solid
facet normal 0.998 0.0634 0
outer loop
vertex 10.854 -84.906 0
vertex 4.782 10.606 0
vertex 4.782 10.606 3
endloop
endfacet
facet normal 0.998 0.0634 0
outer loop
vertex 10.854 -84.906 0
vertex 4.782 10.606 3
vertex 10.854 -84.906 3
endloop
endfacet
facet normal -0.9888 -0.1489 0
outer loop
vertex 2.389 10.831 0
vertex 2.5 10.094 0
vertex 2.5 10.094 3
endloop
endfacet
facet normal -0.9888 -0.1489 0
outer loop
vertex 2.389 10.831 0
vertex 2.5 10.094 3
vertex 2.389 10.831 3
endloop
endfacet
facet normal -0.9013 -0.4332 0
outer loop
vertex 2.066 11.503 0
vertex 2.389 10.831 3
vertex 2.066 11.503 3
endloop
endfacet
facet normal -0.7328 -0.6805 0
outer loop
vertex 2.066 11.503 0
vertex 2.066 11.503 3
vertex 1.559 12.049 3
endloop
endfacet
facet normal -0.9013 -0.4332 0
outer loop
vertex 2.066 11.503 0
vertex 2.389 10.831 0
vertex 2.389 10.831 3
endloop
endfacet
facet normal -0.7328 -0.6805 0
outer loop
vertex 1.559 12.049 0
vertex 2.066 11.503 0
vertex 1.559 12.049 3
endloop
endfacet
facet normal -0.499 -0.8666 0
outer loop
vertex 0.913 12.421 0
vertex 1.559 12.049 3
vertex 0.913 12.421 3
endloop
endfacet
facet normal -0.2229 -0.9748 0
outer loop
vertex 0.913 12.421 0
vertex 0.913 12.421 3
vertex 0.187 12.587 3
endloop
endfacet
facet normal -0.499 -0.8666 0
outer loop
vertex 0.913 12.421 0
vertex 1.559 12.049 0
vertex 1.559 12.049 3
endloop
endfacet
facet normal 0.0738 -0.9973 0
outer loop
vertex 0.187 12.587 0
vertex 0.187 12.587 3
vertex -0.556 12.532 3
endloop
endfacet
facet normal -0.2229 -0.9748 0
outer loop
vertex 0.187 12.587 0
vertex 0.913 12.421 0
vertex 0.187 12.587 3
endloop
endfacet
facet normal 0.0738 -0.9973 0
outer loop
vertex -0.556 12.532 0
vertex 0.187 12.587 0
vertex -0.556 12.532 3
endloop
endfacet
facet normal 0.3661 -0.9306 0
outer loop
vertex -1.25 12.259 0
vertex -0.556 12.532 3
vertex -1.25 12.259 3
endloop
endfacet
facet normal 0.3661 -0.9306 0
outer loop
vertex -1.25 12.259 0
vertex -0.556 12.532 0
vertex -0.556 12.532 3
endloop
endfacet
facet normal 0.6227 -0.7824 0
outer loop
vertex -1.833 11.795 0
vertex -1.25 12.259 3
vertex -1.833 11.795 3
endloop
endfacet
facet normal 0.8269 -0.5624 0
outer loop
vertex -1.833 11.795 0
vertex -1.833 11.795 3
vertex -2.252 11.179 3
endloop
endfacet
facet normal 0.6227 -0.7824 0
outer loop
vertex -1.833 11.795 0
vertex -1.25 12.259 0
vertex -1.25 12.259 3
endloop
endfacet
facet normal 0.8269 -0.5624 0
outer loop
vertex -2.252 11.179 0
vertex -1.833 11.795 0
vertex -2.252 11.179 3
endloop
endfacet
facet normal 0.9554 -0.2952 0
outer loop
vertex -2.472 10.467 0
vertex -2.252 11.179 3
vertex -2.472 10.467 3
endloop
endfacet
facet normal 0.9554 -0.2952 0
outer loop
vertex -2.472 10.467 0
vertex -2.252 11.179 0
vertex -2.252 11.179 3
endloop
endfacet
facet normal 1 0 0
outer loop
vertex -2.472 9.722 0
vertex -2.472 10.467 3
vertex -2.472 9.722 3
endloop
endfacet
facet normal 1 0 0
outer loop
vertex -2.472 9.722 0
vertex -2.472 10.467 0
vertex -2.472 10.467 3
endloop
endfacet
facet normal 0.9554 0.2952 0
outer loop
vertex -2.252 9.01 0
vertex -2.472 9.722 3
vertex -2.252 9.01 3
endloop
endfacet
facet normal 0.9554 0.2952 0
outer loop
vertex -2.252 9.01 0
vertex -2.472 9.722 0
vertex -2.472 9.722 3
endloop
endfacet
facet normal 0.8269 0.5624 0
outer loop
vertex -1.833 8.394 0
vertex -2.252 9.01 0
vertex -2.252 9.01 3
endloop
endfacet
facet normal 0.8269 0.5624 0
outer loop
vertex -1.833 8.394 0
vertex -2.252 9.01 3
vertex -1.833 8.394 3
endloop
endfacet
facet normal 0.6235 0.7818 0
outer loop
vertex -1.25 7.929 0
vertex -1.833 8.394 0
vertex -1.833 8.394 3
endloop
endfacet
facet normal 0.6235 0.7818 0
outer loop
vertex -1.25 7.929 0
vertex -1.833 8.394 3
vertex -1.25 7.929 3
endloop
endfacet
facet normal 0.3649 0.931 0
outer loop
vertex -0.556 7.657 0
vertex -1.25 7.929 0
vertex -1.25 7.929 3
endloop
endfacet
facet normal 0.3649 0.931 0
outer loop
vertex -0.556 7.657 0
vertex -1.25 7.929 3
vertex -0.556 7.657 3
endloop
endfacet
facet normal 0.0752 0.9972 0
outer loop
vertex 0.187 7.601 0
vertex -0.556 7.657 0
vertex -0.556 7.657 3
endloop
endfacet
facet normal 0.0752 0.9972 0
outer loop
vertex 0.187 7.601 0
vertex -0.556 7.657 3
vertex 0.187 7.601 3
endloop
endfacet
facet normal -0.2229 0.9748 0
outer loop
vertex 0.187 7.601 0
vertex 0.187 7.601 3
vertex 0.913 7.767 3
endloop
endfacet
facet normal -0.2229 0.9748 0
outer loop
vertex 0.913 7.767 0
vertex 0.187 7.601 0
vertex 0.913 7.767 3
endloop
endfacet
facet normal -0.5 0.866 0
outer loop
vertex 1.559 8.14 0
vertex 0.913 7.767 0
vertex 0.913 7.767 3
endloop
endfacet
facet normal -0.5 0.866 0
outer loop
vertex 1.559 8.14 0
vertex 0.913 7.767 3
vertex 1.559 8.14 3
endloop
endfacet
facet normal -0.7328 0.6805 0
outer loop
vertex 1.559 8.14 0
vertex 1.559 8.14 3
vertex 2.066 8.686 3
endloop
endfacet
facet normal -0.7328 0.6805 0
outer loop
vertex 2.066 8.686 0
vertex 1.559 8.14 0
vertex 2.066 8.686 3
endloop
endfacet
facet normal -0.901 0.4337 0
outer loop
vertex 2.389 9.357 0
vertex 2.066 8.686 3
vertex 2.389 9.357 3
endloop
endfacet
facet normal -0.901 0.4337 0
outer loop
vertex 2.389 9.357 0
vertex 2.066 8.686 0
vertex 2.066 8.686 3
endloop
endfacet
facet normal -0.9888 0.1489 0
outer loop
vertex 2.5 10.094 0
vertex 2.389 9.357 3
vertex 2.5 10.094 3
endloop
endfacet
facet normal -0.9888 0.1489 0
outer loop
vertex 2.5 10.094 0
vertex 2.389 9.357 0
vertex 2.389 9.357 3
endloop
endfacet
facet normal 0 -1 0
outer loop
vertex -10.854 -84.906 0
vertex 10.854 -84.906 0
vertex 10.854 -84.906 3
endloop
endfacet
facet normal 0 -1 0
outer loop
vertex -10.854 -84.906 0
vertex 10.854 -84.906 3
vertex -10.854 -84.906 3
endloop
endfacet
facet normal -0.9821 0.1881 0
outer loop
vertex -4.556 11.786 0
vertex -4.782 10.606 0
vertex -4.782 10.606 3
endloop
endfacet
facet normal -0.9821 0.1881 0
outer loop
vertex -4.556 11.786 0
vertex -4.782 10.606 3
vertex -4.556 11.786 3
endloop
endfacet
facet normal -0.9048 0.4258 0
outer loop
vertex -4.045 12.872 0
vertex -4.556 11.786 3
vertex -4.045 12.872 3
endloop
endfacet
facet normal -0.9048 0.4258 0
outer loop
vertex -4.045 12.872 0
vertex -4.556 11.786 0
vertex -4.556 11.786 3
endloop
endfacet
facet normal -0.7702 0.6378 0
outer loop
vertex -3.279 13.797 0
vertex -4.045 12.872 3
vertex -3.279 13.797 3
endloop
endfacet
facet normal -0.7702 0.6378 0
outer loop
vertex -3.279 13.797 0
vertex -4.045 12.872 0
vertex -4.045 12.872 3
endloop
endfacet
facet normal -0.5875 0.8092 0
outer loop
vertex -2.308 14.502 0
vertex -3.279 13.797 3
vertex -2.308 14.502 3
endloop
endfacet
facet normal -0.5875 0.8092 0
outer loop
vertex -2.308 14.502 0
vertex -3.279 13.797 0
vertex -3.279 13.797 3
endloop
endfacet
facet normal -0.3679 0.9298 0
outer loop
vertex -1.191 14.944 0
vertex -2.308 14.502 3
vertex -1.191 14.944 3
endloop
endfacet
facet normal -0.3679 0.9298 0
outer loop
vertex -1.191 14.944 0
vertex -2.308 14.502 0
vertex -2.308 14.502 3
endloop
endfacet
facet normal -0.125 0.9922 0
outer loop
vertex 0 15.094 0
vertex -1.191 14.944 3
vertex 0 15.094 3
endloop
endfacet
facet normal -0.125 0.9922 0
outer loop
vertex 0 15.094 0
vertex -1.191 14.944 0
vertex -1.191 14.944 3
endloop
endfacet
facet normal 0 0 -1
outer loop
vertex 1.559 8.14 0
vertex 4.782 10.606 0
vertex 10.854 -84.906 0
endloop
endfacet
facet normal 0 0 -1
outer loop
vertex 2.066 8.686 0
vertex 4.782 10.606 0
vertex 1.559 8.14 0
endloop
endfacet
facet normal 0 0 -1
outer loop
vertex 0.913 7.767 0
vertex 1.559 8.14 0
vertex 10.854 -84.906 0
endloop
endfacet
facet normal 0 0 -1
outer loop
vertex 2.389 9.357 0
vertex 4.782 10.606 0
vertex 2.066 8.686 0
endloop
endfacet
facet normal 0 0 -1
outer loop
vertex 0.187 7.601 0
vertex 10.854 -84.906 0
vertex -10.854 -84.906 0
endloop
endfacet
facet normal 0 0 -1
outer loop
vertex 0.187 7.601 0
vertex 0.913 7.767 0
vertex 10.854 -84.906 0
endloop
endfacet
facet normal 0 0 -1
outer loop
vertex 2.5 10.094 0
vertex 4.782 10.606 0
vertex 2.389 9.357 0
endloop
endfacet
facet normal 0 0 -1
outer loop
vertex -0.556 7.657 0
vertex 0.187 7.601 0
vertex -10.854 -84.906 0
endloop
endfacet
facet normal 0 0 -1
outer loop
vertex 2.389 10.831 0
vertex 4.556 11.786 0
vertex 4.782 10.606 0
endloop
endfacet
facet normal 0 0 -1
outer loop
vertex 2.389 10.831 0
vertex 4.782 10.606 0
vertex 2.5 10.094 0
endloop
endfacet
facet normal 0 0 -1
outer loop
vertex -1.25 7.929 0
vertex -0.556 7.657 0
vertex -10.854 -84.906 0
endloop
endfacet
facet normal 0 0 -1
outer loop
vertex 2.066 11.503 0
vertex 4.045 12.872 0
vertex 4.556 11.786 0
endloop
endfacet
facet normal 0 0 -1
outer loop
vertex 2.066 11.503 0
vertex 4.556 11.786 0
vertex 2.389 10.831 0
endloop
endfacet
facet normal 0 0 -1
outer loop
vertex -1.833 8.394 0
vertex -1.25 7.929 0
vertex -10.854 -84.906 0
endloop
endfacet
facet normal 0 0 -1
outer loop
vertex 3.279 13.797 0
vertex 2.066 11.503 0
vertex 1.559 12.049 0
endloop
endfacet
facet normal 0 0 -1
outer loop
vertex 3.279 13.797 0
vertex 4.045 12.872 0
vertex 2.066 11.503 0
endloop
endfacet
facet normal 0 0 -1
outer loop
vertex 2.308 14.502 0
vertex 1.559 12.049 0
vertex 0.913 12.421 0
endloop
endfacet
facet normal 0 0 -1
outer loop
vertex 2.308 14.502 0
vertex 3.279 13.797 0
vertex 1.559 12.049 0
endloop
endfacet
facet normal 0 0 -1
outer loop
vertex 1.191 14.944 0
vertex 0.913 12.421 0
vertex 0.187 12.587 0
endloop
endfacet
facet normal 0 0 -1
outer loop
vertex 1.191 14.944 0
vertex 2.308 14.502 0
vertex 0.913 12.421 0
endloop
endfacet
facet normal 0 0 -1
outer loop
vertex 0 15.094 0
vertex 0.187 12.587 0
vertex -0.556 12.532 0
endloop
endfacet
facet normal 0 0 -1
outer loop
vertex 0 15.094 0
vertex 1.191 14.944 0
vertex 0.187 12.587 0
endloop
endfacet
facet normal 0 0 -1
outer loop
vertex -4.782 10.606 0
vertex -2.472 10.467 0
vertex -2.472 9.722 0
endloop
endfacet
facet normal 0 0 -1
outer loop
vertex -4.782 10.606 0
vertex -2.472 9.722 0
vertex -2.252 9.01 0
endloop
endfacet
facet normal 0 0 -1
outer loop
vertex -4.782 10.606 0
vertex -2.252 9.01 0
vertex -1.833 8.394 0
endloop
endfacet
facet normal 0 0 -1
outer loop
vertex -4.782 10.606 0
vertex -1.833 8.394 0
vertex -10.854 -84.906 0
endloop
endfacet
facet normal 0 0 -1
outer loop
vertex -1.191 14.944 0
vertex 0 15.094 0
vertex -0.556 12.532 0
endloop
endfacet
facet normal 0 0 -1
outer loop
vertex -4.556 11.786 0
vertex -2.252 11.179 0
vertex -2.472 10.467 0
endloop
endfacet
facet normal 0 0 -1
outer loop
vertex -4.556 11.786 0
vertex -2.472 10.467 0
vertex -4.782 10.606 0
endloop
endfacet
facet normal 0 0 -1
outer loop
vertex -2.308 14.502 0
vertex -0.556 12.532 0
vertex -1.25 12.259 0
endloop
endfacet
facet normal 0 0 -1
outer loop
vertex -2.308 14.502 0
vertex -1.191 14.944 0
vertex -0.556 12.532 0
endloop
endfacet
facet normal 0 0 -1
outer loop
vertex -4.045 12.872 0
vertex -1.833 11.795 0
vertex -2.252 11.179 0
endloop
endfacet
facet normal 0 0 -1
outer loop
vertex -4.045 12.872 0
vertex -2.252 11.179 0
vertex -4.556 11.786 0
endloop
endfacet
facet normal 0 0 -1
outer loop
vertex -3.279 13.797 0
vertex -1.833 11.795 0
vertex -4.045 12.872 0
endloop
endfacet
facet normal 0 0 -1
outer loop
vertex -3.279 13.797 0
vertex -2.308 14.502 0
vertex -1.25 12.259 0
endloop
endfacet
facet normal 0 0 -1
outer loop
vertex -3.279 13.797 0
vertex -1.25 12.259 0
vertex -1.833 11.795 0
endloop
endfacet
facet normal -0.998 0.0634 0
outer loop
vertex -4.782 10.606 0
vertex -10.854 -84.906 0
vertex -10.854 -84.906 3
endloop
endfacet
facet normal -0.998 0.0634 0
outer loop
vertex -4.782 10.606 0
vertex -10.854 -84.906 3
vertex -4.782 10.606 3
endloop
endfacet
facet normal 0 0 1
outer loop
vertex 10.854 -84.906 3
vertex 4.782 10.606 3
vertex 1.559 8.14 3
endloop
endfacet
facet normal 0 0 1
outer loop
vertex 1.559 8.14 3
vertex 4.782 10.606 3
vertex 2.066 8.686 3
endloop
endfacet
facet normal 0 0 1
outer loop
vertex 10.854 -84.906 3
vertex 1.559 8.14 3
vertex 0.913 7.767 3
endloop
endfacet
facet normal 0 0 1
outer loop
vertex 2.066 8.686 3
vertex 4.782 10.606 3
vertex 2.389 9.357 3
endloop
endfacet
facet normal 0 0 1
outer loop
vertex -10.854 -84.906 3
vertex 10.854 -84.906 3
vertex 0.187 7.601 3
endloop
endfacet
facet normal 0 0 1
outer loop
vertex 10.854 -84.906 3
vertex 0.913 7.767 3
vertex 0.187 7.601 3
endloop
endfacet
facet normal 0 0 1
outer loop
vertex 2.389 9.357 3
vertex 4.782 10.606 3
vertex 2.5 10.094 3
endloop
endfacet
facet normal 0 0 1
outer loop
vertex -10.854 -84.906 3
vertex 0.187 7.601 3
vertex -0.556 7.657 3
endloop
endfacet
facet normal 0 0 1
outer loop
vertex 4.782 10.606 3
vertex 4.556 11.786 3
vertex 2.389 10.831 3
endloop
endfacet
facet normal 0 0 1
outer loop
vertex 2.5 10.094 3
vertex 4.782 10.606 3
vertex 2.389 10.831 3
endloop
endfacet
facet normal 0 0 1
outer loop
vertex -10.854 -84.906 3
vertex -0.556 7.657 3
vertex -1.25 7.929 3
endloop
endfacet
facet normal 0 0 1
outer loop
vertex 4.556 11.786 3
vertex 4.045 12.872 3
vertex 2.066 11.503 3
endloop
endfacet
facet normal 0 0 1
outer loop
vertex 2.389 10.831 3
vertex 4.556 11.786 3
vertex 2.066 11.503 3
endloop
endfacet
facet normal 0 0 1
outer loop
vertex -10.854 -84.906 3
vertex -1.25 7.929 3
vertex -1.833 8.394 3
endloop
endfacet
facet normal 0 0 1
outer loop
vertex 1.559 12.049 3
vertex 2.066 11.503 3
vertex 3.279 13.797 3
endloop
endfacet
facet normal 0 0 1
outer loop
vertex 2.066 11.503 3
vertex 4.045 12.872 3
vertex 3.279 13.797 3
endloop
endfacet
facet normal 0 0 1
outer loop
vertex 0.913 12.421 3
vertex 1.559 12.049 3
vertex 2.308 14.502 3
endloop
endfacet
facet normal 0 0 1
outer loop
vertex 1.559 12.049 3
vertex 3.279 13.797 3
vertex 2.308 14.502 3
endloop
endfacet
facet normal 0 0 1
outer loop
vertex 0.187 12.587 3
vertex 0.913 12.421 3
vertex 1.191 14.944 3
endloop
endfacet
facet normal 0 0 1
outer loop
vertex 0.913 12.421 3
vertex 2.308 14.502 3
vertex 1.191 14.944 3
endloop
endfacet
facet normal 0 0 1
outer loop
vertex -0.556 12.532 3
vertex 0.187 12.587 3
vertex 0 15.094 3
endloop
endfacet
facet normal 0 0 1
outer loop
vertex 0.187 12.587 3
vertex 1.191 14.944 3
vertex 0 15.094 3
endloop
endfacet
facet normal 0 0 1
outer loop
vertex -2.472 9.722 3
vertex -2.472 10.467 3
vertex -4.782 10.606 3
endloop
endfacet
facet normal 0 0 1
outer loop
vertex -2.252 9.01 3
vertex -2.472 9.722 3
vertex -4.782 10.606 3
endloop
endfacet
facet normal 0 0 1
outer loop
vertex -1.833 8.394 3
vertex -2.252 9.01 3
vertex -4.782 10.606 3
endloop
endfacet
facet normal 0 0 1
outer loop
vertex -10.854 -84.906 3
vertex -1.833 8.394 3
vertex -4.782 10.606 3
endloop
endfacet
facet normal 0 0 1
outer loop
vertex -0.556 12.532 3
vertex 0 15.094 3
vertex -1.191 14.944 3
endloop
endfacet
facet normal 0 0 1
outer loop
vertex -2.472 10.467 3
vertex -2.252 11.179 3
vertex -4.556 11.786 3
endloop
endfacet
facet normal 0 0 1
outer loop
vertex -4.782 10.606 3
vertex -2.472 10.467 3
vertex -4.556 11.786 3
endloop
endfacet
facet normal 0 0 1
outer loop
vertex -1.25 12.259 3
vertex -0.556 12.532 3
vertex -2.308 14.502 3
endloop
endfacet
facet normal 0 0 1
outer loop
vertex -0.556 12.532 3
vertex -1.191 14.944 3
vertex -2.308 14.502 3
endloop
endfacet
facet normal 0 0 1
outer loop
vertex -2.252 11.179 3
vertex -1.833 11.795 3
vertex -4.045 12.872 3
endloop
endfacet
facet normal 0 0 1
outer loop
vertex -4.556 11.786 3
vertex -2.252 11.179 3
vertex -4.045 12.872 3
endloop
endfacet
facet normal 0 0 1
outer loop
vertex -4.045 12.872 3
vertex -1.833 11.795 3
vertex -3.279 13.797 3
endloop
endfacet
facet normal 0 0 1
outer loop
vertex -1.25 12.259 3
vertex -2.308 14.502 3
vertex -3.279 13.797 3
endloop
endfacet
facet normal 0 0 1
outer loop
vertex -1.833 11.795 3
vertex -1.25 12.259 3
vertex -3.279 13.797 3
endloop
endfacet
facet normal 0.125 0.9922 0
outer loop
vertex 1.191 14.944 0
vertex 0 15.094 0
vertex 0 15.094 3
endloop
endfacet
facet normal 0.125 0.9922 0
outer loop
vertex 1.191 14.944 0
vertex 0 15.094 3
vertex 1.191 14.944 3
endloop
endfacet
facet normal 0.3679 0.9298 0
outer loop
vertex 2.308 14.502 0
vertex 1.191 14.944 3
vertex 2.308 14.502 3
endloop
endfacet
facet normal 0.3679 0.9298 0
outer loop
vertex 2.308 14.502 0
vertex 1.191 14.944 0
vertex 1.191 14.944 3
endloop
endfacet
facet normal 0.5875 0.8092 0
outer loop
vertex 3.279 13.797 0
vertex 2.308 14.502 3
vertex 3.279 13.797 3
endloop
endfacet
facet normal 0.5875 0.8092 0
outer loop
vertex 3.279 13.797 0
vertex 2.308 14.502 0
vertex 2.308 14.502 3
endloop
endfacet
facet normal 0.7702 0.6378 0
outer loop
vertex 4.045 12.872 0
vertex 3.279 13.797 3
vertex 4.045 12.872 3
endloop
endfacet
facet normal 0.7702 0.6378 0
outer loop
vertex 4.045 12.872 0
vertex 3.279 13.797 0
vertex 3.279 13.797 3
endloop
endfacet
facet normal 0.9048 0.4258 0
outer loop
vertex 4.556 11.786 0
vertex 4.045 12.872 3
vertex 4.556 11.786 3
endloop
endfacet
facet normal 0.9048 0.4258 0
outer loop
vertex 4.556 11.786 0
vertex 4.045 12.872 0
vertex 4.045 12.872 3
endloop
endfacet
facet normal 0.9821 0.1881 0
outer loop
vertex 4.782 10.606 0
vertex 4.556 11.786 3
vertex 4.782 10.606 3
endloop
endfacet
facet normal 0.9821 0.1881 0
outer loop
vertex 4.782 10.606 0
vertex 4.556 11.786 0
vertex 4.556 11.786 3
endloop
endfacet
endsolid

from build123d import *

# Parameters (mm, degrees)
SKETCH1_R           = 2.5
BOSS_EXTRUDE1_DEPTH = 3


with BuildPart() as part:
    # Sketch1 → Boss-Extrude1 (new body)
    with BuildSketch(Plane.XY):
        with BuildLine():
            Line((10.853563951, -84.90575827), (-10.853563951, -84.90575827))
            Line((-10.853563951, -84.90575827), (-4.782100014, 10.606475312))
            ThreePointArc((-4.782100014, 10.606475312), (-3.279044371, 13.796592676), (0, 15.09424173))
            ThreePointArc((0, 15.09424173), (3.279044371, 13.796592676), (4.782100014, 10.606475312))
            Line((4.782100014, 10.606475312), (10.853563951, -84.90575827))
        make_face()
        with Locations((0, 10.09424173)):
            Circle(SKETCH1_R, mode=Mode.SUBTRACT)
    extrude(amount=BOSS_EXTRUDE1_DEPTH)


solid = part.part
